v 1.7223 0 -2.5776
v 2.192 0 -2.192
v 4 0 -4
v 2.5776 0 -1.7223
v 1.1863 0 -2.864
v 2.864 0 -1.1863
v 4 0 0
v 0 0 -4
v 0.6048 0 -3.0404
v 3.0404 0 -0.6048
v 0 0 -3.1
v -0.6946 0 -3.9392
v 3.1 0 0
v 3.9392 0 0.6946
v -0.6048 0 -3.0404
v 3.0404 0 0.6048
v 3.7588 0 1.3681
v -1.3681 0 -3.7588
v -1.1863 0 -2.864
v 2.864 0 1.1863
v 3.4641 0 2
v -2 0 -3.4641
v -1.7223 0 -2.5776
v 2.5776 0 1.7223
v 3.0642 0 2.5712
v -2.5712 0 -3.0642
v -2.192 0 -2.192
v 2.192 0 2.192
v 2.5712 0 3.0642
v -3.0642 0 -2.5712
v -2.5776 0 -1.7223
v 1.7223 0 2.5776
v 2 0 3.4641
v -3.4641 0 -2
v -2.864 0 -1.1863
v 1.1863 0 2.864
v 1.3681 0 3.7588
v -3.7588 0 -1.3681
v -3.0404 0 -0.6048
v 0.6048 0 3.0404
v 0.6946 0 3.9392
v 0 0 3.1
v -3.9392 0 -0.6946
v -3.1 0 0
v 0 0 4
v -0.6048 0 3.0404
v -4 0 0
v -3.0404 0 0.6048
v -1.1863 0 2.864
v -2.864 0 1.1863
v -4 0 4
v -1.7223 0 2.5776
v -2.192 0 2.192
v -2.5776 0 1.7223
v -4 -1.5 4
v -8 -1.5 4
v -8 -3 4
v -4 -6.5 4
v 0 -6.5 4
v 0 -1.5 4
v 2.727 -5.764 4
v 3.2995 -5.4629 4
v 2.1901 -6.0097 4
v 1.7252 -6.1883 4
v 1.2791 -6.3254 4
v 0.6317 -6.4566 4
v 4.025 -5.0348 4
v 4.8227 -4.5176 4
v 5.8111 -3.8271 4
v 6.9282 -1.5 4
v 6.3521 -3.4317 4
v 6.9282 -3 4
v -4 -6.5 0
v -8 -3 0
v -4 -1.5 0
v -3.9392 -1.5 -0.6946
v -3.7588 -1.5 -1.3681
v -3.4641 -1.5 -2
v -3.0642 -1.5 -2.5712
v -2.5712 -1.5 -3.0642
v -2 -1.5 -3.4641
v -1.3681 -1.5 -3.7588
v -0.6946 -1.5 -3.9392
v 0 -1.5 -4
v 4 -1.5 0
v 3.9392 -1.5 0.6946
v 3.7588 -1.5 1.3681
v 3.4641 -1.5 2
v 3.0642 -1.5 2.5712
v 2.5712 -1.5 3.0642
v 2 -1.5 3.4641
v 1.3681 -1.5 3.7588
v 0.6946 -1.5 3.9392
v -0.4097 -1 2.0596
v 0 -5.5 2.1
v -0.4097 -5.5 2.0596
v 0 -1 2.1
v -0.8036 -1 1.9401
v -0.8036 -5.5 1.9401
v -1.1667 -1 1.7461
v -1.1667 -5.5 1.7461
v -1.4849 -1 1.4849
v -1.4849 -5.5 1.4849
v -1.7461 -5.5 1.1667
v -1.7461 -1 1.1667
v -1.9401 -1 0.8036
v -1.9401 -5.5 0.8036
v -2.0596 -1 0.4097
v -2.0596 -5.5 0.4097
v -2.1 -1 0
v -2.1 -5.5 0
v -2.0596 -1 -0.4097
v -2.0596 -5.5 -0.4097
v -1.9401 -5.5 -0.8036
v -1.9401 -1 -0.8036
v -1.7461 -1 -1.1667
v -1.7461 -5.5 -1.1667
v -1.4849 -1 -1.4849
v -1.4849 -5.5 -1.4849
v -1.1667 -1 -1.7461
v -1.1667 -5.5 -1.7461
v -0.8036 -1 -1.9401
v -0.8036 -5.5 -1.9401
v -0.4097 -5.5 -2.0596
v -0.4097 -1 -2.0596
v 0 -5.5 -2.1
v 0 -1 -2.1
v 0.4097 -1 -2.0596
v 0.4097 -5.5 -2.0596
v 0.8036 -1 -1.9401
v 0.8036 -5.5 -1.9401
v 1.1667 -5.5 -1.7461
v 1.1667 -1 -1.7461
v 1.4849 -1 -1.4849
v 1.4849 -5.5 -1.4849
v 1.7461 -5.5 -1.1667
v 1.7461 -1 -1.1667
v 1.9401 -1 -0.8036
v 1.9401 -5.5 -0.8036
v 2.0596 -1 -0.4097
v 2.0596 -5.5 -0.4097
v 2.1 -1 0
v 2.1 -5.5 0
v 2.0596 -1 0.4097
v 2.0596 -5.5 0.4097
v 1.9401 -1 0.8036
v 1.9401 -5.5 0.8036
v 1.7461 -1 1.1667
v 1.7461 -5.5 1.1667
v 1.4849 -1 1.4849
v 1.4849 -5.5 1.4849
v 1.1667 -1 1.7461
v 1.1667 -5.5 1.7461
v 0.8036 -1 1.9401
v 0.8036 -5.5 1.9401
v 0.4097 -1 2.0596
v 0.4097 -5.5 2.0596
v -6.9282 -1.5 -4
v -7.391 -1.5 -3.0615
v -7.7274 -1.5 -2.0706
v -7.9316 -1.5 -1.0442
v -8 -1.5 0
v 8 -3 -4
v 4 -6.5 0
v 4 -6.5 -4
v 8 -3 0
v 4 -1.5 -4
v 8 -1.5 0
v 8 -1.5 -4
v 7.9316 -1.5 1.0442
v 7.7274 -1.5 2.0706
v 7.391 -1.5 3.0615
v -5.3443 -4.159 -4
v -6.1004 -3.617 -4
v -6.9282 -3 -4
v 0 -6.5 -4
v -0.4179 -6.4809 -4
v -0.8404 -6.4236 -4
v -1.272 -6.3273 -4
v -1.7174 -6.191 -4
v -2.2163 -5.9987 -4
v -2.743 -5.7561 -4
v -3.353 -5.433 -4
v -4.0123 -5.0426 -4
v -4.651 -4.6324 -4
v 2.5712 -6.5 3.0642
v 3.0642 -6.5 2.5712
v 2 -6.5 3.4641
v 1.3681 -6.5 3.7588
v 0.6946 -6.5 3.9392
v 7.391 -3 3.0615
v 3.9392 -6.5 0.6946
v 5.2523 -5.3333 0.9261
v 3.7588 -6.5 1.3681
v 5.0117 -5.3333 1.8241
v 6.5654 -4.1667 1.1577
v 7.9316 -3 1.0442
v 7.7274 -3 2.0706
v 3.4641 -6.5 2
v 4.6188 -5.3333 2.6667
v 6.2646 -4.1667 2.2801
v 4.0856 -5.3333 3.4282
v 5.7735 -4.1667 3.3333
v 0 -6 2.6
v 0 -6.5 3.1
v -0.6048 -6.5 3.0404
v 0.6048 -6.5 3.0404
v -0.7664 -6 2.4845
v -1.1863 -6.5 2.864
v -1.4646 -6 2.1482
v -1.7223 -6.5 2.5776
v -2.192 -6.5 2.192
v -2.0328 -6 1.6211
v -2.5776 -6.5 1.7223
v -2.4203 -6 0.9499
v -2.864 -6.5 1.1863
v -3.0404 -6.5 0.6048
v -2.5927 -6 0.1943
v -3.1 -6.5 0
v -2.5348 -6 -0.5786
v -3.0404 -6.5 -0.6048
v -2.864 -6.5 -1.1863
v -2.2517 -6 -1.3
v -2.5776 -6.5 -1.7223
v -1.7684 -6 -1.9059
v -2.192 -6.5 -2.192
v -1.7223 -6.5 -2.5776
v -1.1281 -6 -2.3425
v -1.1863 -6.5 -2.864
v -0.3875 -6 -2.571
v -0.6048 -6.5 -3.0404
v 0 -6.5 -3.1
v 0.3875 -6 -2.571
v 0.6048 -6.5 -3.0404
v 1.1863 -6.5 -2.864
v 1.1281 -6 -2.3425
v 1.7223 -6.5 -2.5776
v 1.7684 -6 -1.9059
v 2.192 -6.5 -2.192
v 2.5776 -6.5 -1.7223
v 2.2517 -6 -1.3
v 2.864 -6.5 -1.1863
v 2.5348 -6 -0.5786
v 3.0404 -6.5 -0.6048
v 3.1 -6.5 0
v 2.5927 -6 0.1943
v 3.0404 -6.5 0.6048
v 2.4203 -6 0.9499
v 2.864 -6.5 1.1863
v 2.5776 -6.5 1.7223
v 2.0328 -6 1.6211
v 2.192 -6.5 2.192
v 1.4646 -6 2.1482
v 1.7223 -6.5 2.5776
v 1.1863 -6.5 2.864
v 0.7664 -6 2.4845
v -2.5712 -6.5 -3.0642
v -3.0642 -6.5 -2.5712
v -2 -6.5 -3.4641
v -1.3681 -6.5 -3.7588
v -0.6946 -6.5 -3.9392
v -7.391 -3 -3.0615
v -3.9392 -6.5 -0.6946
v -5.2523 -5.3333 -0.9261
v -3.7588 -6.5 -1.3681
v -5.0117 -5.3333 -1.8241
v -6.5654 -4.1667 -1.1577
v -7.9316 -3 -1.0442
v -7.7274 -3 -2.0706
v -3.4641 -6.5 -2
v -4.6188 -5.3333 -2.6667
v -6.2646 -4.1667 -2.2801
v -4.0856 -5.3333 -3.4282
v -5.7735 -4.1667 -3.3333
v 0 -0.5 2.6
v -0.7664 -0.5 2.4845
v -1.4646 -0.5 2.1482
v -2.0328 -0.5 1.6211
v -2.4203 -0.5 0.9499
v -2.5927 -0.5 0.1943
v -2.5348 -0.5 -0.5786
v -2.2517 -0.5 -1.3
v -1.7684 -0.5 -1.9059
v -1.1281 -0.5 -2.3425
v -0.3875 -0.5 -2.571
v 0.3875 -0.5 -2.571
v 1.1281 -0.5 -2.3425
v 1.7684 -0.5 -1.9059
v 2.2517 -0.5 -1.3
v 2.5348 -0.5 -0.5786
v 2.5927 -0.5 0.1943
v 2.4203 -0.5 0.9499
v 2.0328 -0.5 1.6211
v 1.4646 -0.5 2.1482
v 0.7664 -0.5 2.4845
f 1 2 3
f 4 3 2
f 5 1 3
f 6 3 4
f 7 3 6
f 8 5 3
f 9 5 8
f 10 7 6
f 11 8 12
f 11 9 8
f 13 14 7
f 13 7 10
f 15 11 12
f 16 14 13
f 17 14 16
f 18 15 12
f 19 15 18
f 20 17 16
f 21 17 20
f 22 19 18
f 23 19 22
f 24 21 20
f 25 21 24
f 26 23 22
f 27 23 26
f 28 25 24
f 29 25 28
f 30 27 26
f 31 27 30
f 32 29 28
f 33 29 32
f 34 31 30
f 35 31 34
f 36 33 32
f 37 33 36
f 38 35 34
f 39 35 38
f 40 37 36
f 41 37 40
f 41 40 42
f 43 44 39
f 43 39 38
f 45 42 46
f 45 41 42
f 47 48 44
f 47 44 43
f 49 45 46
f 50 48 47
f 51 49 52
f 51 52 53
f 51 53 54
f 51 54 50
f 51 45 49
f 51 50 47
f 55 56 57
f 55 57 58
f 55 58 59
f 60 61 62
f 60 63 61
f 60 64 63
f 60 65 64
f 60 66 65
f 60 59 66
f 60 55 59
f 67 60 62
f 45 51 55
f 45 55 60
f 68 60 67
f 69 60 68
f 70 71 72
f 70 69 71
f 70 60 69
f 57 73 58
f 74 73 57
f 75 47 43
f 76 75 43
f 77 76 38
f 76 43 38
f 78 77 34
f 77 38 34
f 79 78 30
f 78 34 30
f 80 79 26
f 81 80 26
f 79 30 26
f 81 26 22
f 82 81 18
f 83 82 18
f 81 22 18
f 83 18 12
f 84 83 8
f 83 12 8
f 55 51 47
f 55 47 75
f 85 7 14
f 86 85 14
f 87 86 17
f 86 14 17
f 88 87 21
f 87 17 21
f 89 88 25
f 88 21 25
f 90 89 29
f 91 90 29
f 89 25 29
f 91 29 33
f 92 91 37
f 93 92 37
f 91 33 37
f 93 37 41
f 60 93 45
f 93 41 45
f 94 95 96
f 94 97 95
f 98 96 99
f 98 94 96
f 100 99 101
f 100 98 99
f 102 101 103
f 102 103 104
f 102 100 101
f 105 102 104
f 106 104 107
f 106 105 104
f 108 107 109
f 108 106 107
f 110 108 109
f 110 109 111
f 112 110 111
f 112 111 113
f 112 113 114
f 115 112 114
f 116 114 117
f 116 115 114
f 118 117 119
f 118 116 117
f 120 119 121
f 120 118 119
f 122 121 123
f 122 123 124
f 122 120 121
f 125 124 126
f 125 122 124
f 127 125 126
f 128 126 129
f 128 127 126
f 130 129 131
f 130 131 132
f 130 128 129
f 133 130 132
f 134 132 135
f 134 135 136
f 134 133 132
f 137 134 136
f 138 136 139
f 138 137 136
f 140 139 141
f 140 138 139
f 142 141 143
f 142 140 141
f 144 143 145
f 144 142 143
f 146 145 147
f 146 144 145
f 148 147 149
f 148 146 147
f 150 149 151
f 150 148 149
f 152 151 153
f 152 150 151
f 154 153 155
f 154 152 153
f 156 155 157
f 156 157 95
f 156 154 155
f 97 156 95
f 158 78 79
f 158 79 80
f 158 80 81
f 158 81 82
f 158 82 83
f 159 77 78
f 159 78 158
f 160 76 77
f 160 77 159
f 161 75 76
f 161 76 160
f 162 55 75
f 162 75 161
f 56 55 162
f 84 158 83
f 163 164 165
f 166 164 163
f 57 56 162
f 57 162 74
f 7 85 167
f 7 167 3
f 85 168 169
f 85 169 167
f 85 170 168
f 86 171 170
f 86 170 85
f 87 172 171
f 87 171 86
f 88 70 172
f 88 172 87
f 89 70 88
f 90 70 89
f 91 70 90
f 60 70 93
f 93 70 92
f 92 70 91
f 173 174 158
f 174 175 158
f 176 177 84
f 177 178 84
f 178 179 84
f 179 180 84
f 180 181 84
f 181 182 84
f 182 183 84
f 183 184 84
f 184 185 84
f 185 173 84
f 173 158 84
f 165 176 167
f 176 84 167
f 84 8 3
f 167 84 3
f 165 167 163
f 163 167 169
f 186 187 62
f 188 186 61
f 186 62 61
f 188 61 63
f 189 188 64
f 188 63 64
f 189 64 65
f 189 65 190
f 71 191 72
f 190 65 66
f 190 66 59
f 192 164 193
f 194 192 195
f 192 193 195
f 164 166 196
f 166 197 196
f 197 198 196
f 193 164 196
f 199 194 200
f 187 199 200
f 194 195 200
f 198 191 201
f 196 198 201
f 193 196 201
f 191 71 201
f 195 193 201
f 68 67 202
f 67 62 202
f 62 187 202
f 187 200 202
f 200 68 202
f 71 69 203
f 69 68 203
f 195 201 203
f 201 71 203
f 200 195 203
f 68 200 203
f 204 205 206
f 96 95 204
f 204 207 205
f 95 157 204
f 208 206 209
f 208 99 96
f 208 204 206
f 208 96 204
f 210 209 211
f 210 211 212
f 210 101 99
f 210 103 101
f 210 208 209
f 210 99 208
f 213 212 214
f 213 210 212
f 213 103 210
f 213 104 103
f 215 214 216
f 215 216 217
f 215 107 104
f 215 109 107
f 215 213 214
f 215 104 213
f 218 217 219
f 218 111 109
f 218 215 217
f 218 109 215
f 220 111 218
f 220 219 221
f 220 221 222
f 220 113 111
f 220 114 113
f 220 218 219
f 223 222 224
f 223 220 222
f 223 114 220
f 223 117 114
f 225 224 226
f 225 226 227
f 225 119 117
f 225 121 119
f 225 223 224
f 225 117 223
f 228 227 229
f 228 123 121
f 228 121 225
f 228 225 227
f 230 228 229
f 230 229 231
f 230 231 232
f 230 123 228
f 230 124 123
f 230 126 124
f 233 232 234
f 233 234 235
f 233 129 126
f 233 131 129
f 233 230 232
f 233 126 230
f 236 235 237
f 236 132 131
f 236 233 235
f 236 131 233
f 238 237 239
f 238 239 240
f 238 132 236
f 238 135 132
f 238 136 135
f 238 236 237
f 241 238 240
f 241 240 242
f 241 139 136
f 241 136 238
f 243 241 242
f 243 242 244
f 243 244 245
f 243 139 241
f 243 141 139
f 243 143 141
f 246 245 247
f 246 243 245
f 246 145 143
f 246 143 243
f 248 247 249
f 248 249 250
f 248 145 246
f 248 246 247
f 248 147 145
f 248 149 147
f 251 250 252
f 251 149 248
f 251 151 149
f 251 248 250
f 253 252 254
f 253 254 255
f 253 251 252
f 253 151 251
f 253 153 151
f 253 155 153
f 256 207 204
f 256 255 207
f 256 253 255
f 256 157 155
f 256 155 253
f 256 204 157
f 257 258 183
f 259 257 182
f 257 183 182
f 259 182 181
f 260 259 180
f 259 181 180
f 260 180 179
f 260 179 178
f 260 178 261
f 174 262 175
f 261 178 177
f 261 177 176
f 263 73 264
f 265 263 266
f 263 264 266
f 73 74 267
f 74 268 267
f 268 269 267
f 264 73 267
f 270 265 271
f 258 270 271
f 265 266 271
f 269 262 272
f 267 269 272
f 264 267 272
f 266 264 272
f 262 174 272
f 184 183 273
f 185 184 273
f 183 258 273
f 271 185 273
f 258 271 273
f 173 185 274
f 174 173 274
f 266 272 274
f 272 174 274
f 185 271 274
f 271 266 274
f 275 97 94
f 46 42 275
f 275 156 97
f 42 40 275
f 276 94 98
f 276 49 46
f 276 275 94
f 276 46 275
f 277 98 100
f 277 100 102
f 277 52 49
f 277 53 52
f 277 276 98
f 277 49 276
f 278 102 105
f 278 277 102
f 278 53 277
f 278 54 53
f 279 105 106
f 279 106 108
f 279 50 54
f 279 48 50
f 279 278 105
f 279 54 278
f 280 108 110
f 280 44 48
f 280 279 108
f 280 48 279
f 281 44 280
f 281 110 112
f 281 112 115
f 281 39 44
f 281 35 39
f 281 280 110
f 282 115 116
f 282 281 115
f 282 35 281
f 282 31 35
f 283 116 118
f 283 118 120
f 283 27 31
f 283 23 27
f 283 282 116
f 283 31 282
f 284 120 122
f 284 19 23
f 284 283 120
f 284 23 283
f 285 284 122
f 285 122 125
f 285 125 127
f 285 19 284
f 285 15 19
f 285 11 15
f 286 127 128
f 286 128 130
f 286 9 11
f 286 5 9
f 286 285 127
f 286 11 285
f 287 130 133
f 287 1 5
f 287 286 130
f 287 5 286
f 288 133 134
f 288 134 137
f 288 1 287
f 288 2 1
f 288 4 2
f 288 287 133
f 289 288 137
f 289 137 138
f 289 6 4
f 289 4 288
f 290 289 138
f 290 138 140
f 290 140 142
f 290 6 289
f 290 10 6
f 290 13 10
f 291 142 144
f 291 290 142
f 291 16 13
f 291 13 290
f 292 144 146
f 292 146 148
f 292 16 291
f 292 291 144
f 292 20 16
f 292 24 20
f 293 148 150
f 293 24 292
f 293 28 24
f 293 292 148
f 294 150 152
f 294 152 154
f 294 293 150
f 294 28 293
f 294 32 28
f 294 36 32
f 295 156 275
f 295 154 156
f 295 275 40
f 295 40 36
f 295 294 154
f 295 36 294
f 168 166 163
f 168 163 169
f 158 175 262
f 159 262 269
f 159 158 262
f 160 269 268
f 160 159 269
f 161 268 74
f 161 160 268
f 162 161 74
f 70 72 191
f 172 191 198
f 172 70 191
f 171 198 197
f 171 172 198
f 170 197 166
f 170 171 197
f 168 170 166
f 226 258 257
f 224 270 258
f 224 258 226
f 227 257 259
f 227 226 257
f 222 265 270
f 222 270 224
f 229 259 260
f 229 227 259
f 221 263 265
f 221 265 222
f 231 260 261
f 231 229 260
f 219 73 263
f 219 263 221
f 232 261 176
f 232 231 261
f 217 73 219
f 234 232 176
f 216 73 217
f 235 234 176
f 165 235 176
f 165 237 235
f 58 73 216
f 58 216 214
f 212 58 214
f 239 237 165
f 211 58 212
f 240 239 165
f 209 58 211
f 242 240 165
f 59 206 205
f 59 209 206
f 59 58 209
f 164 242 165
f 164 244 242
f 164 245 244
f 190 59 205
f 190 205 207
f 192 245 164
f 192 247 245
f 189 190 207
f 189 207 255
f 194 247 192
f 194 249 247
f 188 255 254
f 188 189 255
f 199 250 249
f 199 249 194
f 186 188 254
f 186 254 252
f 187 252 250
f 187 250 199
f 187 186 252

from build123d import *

# Parameters (mm, degrees)
EXTRUDE_1_DEPTH     = 4
CUT_EXTRUDE_1_DEPTH = 1.5
CUT_EXTRUDE_2_DEPTH = 6


with BuildPart() as part:
    # Эскиз1 → Бобышка-Вытянуть1 (new body, symmetric)
    with BuildSketch(Plane.XY):
        Polygon((4, 0), (-4, 0), (-4, -1.5), (-8, -1.5), (-8, -6.5), (8, -6.5), (8, -1.5), (4, -1.5), align=None)
    extrude(amount=EXTRUDE_1_DEPTH, both=True)

    # Эскиз3 → Отверстие обработанное метчиком M52 (revolve, cut)
    with BuildSketch(Plane(origin=(0, 0, 0), x_dir=(0, 0, 1), z_dir=(1, 0, 0))):
        Polygon((0, 0), (0, 6.5), (3.1, 6.5), (2.1, 5.5), (2.1, 1), (3.1, 0), align=None)
    revolve(axis=Axis((0, 6.35, 0), (0, -1, 0)), mode=Mode.SUBTRACT)

    # Эскиз4 → Вырез-Вытянуть1 (cut)
    with BuildSketch(Plane(origin=(0, 0, 0), x_dir=(1, 0, 0), z_dir=(0, 1, 0))):
        with BuildLine():
            Line((-4, 4), (-4, 0))
            ThreePointArc((-4, 0), (-2.828427125, 2.828427125), (0, 4))
            Line((0, 4), (-4, 4))
        make_face()
        with BuildLine():
            Line((0, -4), (4, -4))
            Line((4, -4), (4, 0))
            ThreePointArc((4, 0), (2.828427125, -2.828427125), (0, -4))
        make_face()
    extrude(amount=-CUT_EXTRUDE_1_DEPTH, mode=Mode.SUBTRACT)

    # Эскиз5 → Вырез-Вытянуть2 (cut, through all)
    with BuildSketch(Plane(origin=(0, -1.5, 0), x_dir=(1, 0, 0), z_dir=(0, 1, 0))):
        with BuildLine():
            Line((-8, 0), (-8, 4))
            Line((-8, 4), (-6.92820323, 4))
            ThreePointArc((-6.92820323, 4), (-7.72740661, 2.070552361), (-8, 0))
        make_face()
        with BuildLine():
            Line((8, 0), (8, -4))
            Line((8, -4), (6.92820323, -4))
            ThreePointArc((6.92820323, -4), (7.72740661, -2.070552361), (8, 0))
        make_face()
    extrude(amount=-CUT_EXTRUDE_2_DEPTH, mode=Mode.SUBTRACT)

    # Вырез-По траектории1: sweep along a path in Эскиз7
    with BuildLine(Plane.XZ.offset(6.5)) as sweep_1_path:
        Line((0, 8), (-8, 8))
        Line((-8, 8), (-8, 0))
        ThreePointArc((-8, 0), (-5.656854249, -5.656854249), (0, -8))
        Line((0, -8), (8, -8))
        Line((8, -8), (8, 0))
        ThreePointArc((8, 0), (5.656854249, 5.656854249), (0, 8))
    # Эскиз6 → Вырез-По траектории1 (sweep, cut)
    with BuildSketch(Plane.XY.offset(4)):
        Polygon((-8, -3), (-8, -6.5), (-4, -6.5), align=None)
    sweep(path=sweep_1_path.line, transition=Transition.RIGHT, mode=Mode.SUBTRACT)


solid = part.part
